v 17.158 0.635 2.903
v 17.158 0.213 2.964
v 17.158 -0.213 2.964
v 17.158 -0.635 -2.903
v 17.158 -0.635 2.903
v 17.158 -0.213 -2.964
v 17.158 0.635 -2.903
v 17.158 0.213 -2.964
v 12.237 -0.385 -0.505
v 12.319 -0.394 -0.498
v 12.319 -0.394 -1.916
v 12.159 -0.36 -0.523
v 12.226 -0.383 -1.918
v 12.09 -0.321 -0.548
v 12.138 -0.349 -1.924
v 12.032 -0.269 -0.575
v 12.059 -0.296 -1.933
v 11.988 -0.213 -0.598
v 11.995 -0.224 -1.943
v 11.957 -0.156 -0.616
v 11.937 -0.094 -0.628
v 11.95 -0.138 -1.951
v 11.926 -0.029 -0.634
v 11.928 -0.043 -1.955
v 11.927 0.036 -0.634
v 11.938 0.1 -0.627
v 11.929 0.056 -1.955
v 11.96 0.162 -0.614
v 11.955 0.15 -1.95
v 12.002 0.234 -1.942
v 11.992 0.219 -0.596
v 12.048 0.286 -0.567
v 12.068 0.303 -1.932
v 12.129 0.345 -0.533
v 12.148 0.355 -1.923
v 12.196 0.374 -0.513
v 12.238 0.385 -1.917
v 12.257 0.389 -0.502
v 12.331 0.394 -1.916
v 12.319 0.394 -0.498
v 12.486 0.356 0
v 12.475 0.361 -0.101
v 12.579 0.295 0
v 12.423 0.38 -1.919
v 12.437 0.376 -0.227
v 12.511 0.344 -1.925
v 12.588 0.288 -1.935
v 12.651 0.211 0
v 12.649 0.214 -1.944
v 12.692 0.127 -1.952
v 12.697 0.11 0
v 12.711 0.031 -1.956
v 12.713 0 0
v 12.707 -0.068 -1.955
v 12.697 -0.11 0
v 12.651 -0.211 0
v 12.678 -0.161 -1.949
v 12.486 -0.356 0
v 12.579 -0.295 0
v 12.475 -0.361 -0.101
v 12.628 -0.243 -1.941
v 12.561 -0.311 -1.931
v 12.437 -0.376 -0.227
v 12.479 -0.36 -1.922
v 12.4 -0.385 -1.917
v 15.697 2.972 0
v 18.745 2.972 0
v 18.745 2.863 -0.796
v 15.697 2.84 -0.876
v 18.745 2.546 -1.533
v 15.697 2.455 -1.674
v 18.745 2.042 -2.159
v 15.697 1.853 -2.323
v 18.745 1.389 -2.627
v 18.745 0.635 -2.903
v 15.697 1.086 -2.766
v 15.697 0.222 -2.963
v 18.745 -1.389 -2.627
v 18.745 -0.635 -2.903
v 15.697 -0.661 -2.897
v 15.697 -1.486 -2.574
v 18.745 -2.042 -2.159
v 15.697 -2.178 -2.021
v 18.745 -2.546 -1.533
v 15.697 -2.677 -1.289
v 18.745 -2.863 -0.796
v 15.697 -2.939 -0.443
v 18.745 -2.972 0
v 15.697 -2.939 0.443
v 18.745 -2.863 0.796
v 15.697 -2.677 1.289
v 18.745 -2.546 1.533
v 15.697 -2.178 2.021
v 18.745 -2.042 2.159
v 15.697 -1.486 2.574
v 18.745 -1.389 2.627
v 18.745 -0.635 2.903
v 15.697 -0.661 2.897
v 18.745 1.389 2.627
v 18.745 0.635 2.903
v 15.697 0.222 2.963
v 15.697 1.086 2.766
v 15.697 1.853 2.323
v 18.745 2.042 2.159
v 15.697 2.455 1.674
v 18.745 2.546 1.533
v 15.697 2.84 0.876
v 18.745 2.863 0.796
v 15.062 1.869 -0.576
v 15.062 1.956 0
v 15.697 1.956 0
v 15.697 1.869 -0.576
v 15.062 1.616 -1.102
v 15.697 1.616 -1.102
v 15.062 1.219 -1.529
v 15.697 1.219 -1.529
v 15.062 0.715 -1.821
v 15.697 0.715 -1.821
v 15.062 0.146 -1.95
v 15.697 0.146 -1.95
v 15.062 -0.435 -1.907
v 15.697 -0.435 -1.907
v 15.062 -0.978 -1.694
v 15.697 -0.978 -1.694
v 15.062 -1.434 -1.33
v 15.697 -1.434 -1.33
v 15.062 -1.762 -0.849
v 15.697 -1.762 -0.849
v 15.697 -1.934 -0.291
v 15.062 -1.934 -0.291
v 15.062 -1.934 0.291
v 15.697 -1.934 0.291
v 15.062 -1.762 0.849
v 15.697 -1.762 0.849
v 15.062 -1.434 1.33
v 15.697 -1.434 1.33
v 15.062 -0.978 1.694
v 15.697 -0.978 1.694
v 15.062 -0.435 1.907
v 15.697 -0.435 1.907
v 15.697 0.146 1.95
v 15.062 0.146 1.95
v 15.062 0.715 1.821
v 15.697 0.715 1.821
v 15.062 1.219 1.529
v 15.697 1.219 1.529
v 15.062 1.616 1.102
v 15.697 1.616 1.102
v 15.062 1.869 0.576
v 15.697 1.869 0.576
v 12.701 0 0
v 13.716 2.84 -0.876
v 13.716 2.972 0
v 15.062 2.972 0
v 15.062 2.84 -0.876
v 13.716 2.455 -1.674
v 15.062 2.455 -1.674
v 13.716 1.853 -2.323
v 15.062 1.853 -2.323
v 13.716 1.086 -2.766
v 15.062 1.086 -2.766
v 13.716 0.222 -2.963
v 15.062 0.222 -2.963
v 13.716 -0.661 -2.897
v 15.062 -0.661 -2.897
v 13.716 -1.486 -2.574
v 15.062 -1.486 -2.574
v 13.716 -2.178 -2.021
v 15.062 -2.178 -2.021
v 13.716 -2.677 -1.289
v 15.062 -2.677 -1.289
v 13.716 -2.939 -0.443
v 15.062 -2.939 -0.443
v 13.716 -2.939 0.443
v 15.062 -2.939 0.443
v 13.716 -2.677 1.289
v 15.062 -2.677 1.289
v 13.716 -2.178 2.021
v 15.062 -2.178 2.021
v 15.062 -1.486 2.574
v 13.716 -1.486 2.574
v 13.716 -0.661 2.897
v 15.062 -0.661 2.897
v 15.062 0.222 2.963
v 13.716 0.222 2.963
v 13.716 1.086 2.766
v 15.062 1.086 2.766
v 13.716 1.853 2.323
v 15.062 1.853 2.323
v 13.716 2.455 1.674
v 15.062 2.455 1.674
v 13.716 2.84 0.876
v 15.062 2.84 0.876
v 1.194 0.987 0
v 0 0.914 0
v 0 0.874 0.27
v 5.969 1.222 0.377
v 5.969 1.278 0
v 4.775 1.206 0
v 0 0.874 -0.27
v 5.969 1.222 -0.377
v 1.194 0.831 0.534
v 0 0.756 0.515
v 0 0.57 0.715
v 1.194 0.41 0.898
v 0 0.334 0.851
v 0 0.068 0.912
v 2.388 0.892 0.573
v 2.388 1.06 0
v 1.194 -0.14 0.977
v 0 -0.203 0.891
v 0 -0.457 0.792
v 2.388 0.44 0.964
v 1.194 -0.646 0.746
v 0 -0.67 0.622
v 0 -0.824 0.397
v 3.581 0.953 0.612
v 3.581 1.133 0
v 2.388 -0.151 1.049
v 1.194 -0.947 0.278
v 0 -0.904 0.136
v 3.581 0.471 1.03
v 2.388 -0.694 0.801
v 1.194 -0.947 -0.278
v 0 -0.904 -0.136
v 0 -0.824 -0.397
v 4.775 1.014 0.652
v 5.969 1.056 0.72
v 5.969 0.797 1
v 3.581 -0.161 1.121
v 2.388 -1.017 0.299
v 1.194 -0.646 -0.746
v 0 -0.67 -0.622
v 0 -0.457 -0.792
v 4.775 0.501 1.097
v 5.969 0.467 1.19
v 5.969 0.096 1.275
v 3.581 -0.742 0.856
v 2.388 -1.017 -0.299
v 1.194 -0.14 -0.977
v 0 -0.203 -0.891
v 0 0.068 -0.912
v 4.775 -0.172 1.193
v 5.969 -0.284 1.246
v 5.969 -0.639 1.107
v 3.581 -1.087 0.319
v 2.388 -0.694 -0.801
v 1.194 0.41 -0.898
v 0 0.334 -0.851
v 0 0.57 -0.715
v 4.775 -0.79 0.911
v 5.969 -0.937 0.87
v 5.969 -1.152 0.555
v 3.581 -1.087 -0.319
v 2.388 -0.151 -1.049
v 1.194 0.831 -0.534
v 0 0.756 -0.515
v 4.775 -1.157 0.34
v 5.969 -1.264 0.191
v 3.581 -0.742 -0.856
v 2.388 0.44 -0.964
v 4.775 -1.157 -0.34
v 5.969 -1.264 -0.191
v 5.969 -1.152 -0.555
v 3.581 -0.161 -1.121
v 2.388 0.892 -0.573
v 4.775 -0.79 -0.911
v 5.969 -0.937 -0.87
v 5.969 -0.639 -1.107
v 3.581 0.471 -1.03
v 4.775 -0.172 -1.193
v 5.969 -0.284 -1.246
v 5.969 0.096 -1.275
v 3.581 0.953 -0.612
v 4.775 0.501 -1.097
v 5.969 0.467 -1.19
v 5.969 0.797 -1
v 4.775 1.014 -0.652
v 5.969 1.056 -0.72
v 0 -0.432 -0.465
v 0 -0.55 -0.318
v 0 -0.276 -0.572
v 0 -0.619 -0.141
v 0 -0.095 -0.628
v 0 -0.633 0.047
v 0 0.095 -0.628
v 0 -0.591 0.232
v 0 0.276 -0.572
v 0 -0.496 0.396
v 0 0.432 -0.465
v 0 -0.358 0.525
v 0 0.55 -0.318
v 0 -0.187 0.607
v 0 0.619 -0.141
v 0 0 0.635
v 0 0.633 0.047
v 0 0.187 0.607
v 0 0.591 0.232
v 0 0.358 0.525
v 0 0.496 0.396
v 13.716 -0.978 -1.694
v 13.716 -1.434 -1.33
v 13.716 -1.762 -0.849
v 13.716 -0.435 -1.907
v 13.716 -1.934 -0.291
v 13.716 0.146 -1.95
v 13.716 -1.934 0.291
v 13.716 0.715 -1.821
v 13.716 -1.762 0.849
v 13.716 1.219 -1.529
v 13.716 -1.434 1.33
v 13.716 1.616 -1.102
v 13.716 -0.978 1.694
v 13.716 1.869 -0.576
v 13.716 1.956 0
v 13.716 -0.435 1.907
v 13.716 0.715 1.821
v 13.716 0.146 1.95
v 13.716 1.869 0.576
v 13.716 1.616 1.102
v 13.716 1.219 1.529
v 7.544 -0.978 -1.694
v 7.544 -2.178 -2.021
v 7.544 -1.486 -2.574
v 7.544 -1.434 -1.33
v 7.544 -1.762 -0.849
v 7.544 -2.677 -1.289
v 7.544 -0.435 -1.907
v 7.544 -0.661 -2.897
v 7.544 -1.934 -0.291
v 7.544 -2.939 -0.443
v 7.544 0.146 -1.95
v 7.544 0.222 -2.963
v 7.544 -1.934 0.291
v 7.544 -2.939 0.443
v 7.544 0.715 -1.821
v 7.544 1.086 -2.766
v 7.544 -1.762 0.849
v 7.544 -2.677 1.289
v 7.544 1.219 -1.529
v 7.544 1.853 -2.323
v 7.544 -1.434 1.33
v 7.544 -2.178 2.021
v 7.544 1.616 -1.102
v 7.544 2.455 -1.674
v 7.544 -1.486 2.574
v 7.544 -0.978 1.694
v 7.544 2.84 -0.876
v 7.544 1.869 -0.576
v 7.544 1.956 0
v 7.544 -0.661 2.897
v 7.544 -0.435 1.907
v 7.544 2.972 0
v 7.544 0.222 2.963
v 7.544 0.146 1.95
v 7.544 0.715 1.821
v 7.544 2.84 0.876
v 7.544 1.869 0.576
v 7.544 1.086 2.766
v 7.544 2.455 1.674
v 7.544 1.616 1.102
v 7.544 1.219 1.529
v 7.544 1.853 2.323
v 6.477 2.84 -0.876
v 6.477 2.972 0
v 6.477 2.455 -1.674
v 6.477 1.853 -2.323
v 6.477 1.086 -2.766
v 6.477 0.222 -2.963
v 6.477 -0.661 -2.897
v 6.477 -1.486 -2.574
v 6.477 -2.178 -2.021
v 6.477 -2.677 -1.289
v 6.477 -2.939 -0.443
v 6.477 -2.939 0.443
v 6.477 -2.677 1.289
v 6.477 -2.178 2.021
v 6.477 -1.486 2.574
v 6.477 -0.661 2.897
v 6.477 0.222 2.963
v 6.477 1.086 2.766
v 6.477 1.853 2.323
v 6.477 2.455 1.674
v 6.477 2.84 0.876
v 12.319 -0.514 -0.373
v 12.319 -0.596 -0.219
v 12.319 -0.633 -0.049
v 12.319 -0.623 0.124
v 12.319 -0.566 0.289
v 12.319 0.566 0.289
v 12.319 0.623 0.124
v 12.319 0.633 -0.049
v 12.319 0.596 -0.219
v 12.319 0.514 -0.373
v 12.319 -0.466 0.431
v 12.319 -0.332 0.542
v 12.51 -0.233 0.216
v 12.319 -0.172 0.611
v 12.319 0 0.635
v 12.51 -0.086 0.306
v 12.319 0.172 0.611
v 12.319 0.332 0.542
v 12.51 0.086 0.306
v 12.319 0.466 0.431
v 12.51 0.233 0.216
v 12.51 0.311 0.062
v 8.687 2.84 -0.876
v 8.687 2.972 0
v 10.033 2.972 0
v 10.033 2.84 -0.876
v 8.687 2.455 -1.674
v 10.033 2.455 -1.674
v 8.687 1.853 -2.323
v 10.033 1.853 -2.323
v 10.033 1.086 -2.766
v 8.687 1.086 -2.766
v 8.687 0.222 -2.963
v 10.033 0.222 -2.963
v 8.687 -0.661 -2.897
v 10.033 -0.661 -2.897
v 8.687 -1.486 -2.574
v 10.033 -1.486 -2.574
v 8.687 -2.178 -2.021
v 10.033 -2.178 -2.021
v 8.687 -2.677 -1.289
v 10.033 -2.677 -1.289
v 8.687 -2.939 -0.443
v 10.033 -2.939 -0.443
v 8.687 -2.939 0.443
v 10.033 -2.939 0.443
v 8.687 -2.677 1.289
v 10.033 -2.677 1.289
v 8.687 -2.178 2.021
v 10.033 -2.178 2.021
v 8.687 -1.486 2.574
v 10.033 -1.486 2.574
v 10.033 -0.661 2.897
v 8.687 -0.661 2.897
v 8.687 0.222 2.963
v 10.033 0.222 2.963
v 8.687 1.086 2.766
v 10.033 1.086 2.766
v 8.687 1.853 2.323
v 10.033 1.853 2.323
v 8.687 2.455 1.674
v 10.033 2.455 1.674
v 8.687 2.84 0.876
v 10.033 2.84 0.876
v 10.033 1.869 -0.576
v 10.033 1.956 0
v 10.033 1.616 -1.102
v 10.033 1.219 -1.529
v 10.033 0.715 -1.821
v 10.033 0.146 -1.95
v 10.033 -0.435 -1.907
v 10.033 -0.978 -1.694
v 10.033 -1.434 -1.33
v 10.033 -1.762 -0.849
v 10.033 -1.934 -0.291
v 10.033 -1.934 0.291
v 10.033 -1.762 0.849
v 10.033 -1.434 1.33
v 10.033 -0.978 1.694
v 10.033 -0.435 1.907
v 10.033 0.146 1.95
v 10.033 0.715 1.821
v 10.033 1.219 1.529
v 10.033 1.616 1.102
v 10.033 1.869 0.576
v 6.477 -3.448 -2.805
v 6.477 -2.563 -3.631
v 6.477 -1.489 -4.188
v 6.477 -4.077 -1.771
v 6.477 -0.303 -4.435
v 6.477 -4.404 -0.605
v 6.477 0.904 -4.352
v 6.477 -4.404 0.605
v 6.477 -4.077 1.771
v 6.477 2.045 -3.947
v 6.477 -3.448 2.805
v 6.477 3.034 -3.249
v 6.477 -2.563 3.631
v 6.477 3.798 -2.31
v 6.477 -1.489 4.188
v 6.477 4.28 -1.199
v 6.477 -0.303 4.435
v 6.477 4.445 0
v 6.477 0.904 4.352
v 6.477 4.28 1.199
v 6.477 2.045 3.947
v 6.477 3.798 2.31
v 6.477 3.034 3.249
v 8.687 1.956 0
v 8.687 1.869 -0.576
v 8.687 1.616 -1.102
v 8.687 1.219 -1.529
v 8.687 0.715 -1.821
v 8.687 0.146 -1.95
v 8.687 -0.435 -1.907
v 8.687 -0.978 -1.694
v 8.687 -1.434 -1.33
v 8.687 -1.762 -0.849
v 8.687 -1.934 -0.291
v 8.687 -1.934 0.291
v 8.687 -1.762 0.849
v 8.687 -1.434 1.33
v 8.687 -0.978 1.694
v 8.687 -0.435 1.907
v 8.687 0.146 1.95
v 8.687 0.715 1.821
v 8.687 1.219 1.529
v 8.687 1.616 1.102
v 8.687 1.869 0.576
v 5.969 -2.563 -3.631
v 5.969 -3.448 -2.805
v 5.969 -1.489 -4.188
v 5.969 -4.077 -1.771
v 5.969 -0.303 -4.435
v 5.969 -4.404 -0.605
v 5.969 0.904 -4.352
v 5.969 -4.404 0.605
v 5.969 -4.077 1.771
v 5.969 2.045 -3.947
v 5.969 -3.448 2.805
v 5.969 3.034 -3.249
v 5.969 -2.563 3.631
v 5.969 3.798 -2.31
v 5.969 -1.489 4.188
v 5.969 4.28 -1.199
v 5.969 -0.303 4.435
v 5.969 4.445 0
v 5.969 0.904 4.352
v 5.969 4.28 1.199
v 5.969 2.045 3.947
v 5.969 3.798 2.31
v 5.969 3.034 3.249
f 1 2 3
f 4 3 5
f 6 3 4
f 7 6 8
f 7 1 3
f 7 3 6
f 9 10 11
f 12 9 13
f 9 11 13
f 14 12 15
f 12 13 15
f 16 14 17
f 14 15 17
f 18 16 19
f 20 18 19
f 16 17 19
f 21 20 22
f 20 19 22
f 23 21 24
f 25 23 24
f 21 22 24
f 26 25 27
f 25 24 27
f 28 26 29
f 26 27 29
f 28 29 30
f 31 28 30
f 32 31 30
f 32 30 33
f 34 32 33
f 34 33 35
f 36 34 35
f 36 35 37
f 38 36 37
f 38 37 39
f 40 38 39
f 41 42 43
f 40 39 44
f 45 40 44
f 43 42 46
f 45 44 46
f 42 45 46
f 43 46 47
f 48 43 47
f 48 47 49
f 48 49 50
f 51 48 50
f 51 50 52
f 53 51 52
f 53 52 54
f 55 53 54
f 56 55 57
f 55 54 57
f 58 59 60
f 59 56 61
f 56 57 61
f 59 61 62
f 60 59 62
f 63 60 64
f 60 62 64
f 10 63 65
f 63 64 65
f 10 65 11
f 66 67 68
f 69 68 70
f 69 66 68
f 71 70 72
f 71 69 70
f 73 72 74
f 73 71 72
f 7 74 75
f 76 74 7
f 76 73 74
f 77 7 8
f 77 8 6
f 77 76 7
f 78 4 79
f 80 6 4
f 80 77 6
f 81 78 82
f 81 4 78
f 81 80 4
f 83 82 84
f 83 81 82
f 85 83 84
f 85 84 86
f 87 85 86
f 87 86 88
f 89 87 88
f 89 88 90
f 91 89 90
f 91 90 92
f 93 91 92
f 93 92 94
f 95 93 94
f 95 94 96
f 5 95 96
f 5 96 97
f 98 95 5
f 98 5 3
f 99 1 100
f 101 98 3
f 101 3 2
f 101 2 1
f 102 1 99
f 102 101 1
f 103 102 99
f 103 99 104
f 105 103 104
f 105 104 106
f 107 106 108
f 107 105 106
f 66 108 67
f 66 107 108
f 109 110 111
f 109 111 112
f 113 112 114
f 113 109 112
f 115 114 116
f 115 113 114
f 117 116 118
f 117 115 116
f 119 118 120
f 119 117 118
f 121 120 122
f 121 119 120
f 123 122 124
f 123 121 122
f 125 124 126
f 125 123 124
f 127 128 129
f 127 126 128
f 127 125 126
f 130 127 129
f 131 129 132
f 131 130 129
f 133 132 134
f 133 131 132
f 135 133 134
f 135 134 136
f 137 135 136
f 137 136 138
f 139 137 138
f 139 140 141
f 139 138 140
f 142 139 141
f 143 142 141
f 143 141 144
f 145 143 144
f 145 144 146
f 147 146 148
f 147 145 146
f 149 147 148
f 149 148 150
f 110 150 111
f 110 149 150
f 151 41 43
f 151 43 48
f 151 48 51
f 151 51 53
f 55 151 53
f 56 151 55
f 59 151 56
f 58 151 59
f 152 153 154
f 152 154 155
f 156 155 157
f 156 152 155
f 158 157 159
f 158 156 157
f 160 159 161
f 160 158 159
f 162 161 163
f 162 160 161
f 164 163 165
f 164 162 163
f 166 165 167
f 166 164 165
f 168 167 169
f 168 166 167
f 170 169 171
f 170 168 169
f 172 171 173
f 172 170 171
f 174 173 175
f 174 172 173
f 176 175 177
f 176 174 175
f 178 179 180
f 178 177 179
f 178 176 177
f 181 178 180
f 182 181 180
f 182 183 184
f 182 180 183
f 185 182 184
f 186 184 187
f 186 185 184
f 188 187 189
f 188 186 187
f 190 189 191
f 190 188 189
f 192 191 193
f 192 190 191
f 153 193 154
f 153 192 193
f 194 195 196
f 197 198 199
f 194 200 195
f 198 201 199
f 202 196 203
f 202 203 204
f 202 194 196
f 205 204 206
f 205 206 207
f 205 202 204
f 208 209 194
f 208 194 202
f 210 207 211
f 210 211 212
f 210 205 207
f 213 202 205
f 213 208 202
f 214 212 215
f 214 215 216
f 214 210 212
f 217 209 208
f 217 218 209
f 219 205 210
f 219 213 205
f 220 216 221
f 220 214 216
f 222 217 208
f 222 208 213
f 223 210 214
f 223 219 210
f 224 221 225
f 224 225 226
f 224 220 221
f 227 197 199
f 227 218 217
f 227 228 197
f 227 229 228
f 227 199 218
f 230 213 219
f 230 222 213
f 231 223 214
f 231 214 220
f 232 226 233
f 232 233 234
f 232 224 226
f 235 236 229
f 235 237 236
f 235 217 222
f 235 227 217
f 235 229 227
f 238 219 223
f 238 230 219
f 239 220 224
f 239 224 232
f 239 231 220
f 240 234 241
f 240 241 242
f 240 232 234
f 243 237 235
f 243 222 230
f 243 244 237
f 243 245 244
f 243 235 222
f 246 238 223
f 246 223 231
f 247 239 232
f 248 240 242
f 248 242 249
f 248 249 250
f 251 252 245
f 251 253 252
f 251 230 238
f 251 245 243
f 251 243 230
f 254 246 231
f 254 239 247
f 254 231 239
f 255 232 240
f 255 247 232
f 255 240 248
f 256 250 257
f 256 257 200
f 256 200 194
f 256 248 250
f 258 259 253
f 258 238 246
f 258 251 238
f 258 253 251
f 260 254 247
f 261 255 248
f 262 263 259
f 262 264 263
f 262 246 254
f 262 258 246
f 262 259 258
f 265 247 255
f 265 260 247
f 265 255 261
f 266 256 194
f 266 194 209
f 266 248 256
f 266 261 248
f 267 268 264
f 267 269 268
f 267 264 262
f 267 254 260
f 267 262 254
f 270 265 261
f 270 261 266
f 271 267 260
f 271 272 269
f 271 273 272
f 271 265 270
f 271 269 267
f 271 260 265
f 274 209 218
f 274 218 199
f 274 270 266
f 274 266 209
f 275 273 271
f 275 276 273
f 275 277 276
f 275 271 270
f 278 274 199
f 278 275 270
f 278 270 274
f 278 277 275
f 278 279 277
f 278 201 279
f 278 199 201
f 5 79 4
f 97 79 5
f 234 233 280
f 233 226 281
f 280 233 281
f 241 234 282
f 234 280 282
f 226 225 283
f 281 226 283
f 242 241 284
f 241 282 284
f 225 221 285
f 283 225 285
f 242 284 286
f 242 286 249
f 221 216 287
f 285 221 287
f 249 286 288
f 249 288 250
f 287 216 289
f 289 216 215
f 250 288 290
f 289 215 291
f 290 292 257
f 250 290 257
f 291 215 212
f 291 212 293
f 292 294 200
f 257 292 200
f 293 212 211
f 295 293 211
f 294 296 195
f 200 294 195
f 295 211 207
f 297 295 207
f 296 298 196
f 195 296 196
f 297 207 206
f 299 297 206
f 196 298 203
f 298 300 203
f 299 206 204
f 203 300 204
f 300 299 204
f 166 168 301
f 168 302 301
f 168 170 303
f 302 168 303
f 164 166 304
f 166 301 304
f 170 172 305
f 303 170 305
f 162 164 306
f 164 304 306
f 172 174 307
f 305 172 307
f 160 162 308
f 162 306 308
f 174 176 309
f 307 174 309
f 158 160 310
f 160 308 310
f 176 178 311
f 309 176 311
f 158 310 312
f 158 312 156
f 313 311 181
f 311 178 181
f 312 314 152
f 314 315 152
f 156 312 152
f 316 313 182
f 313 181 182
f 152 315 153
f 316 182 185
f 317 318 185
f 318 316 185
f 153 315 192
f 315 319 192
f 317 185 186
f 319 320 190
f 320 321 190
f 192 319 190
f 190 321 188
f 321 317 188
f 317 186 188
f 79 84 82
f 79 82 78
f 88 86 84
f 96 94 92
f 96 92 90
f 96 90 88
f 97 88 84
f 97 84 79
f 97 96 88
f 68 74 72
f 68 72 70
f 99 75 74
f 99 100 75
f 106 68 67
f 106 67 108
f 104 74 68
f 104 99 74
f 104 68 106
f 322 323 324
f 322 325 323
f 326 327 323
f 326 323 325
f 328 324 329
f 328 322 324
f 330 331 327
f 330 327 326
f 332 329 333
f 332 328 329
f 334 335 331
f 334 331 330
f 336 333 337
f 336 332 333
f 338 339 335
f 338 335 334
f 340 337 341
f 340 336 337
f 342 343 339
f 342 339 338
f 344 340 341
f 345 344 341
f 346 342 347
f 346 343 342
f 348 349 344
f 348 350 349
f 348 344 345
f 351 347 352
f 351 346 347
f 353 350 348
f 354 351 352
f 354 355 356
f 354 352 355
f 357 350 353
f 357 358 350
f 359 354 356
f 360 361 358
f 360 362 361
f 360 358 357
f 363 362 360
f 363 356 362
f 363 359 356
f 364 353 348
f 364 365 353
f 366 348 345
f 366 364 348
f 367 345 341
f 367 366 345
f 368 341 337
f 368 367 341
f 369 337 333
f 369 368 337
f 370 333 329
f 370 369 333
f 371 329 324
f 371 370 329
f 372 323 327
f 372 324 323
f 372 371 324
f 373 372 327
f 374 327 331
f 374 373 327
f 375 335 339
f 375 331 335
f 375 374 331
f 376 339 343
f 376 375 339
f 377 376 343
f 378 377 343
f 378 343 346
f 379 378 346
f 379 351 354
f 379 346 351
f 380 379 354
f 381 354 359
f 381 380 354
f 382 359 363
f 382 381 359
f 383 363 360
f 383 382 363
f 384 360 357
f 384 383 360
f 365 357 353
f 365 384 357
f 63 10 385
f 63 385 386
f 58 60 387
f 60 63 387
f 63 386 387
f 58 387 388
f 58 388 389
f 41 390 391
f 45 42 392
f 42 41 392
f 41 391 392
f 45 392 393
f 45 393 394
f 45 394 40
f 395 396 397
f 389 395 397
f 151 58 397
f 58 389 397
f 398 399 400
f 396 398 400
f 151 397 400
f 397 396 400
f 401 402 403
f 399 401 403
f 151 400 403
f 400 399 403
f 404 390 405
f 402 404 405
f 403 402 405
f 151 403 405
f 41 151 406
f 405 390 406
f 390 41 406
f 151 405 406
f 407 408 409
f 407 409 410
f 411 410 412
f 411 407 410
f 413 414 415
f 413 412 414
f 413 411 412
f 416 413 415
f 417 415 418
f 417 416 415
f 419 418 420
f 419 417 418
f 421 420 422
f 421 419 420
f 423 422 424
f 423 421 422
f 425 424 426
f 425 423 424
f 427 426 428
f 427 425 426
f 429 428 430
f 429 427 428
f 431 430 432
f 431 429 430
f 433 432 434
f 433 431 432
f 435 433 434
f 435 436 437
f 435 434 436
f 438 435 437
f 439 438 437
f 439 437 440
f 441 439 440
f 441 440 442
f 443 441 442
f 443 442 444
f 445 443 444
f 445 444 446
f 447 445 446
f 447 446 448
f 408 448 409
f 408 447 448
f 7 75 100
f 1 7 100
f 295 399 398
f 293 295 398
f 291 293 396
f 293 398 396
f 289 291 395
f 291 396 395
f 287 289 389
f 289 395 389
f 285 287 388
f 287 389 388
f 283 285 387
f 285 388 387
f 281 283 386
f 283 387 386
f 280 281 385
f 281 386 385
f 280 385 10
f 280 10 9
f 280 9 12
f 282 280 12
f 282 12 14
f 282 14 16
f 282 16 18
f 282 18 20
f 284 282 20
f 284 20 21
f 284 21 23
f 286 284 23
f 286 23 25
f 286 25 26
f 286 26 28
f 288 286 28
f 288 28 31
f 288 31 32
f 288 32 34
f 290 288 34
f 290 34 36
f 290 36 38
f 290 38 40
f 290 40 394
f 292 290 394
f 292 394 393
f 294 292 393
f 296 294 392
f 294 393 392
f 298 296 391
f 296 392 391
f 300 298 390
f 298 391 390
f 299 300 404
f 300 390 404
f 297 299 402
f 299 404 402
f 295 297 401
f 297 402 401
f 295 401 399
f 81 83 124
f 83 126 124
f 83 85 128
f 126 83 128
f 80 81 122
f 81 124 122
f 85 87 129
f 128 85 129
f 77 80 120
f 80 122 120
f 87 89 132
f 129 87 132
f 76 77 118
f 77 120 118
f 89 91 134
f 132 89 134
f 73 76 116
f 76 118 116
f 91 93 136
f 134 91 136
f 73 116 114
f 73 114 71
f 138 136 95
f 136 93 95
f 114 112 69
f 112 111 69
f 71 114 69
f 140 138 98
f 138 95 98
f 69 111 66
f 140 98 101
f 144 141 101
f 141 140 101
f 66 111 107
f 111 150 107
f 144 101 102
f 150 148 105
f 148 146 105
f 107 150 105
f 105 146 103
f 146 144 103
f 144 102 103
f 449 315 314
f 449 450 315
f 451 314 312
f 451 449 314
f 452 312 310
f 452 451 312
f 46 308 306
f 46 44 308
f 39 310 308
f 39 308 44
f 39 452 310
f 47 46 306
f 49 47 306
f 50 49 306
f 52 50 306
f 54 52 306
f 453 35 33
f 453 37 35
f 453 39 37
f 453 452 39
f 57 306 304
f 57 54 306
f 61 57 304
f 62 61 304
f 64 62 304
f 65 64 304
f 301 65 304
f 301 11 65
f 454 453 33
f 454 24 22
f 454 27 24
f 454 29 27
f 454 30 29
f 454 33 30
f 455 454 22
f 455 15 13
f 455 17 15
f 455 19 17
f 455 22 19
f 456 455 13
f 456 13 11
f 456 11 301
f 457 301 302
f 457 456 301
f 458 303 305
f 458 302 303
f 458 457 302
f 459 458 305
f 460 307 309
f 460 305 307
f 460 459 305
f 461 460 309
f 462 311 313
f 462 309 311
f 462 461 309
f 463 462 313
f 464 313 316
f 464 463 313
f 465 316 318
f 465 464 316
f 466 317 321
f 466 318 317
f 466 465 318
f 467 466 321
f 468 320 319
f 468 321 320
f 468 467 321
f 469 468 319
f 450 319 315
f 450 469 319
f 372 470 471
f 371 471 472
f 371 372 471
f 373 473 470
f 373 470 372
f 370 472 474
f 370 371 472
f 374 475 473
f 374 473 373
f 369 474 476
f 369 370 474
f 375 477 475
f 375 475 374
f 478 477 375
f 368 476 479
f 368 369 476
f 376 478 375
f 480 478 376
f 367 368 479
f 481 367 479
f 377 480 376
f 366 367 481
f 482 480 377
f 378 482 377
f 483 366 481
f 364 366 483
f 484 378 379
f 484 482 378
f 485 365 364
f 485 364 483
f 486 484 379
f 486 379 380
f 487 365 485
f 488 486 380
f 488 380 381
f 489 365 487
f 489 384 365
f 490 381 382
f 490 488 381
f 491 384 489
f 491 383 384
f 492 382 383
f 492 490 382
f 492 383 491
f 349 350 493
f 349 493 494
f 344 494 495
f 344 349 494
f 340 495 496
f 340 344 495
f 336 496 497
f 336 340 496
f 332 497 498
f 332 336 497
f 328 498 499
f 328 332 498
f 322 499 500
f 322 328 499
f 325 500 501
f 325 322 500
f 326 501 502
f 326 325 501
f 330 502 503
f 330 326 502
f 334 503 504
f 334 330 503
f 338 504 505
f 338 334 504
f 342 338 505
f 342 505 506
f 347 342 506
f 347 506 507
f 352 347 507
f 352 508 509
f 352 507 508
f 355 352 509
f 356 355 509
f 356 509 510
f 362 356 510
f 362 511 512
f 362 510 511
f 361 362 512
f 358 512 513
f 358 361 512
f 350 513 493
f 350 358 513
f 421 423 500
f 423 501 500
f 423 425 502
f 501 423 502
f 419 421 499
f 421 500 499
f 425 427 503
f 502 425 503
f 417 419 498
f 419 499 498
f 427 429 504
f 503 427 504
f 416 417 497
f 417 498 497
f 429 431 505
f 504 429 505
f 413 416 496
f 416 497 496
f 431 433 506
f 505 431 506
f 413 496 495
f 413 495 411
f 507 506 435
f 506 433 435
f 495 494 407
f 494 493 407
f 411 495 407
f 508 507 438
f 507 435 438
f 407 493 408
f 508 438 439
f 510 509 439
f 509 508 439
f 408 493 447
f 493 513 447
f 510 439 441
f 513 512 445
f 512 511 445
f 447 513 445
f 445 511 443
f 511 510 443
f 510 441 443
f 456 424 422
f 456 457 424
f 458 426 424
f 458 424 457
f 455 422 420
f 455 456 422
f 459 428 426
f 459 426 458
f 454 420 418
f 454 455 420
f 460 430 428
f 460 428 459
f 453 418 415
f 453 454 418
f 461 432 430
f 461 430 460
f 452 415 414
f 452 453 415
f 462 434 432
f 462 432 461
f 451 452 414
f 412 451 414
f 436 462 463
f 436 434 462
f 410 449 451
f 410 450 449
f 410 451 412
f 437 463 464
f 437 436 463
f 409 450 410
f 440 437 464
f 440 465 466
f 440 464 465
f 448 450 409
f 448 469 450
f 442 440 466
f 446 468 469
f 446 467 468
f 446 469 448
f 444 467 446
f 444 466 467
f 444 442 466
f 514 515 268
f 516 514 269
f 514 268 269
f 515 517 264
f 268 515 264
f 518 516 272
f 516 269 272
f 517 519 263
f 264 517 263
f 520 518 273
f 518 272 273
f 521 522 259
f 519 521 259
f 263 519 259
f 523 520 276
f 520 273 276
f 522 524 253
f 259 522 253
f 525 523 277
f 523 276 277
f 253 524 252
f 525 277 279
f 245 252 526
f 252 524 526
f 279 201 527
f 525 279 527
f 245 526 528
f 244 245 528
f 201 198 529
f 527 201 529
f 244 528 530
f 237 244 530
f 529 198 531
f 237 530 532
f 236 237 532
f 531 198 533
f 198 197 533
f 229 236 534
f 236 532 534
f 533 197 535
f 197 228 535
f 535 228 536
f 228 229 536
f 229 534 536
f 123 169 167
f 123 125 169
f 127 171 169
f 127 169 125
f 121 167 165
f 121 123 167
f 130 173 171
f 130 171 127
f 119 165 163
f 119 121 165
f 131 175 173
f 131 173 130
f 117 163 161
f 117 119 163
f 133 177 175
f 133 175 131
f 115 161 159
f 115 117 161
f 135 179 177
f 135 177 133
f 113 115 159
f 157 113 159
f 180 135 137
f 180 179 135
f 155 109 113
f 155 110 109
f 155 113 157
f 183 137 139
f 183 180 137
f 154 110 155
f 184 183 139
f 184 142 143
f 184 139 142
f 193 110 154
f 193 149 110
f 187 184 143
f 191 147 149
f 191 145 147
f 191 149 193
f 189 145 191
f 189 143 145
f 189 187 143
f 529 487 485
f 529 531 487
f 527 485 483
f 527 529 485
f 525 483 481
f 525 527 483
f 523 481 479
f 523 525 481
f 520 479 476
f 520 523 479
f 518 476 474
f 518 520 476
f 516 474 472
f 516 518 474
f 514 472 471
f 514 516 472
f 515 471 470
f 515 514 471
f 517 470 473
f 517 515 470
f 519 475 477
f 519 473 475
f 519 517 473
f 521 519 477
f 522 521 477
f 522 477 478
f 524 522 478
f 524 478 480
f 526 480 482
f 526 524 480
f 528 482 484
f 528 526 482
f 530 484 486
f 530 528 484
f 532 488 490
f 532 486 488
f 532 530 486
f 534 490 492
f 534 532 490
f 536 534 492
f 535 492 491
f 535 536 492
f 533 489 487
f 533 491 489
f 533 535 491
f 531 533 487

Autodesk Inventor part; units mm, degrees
ref_plane "YZ Plane" through (0, 0, 0) normal (1, 0, 0) x (0, 1, 0)
ref_plane "XZ Plane" through (0, 0, 0) normal (0, 1, 0) x (-1, 0, 0)
ref_plane "XY Plane" through (0, 0, 0) normal (0, 0, 1) x (1, 0, 0)
sketch "Sketch1" plane through (0, 0, 0) normal (0, 0, 1) x (1, 0, 0)
  line L0 (0, 0) -> (18.7452, 0)
  line L1 (18.7452, 0) -> (18.7452, 2.9718)
  line L2 (18.7452, 2.9718) -> (15.6972, 2.9718)
  line L3 (15.6972, 2.9718) -> (15.6972, 1.9558)
  line L4 (15.6972, 1.9558) -> (15.0622, 1.9558)
  line L5 (15.0622, 1.9558) -> (15.0622, 2.9718)
  line L6 (15.0622, 2.9718) -> (13.716, 2.9718)
  line L7 (13.716, 2.9718) -> (13.716, 1.9558)
  line L8 (13.716, 1.9558) -> (10.033, 1.9558)
  line L9 (10.033, 1.9558) -> (10.033, 2.9718)
  line L10 (10.033, 2.9718) -> (8.6868, 2.9718)
  line L11 (8.6868, 2.9718) -> (8.6868, 1.9558)
  line L12 (8.6868, 1.9558) -> (7.5438, 1.9558)
  line L13 (7.5438, 1.9558) -> (7.5438, 2.9718)
  line L14 (7.5438, 2.9718) -> (6.477, 2.9718)
  line L15 (6.477, 2.9718) -> (6.477, 4.445)
  line L16 (6.477, 4.445) -> (5.969, 4.445)
  line L17 (5.969, 4.445) -> (5.969, 1.2785)
  line L18 (0, 0) -> (0, 0.9144)
  line L19 (0, 0.9144) -> (5.969, 1.2785)
  dimension "d0" = 18.7452
  dimension "d1" = 2.9718
  dimension "d2" = 3.048
  dimension "d3" = 1.016
  dimension "d4" = 0.635
  dimension "d5" = 1.3462
  dimension "d6" = 3.683
  dimension "d7" = 1.3462
  dimension "d8" = 1.143
  dimension "d9" = 1.0668
  dimension "d10" = 1.4732
  dimension "d11" = 0.508
  dimension "d12" = 0.9144
revolve "Revolution1" add sketch "Sketch1" angle 360 about axis through (0, 0, 0) along (1, 0, 0)
hole "Hole1" at (0, 0, 0) direction (1, 0, 0) diameter 1.27 depth 12.319 tip angle 118
thread "Thread1" size "1/4-20 UNC" class "2A" standard "ANSI Unified Screw Threads" full length
sketch "Sketch2" plane through (18.7452, 0, 0) normal (1, 0, 0) x (0, 0, -1)
  circle A0 centre (0, 0) radius 2.9718 projected
  line L0 (0, 0) -> (0, 0.635)
  line L1 (0, 0.635) -> (-2.9972, 0.635)
  line L2 (-2.9972, 0.635) -> (2.9718, 0.635)
  line L3 (2.9718, 0.635) -> (2.9718, -0.635)
  line L4 (2.9718, -0.635) -> (-2.9972, -0.635)
  line L5 (-2.9972, -0.635) -> (-2.9972, 0.635)
  dimension "d25" = 0.635
  dimension "d26" = 2.9972
  dimension "d27" = 5.969
  dimension "d28" = 1.27
extrude "Extrusion1" cut sketch "Sketch2" against normal blind 1.5875 contours A0 L4 L1 L2 | L3 L4 A0 | A0 L2 L3 | A0 L4 L5 L1
sketch "Sketch3" plane through (0, 0, 0) normal (0, 0, 1) x (1, 0, 0)
  line L0 (0, 0) -> (12.319, 0)
  dimension "d31" = 12.319
hole "Hole2" at (12.319, 0, 0) direction (0, 0, -1) diameter 0.7874 end through all
properties part number "Carburetor"
